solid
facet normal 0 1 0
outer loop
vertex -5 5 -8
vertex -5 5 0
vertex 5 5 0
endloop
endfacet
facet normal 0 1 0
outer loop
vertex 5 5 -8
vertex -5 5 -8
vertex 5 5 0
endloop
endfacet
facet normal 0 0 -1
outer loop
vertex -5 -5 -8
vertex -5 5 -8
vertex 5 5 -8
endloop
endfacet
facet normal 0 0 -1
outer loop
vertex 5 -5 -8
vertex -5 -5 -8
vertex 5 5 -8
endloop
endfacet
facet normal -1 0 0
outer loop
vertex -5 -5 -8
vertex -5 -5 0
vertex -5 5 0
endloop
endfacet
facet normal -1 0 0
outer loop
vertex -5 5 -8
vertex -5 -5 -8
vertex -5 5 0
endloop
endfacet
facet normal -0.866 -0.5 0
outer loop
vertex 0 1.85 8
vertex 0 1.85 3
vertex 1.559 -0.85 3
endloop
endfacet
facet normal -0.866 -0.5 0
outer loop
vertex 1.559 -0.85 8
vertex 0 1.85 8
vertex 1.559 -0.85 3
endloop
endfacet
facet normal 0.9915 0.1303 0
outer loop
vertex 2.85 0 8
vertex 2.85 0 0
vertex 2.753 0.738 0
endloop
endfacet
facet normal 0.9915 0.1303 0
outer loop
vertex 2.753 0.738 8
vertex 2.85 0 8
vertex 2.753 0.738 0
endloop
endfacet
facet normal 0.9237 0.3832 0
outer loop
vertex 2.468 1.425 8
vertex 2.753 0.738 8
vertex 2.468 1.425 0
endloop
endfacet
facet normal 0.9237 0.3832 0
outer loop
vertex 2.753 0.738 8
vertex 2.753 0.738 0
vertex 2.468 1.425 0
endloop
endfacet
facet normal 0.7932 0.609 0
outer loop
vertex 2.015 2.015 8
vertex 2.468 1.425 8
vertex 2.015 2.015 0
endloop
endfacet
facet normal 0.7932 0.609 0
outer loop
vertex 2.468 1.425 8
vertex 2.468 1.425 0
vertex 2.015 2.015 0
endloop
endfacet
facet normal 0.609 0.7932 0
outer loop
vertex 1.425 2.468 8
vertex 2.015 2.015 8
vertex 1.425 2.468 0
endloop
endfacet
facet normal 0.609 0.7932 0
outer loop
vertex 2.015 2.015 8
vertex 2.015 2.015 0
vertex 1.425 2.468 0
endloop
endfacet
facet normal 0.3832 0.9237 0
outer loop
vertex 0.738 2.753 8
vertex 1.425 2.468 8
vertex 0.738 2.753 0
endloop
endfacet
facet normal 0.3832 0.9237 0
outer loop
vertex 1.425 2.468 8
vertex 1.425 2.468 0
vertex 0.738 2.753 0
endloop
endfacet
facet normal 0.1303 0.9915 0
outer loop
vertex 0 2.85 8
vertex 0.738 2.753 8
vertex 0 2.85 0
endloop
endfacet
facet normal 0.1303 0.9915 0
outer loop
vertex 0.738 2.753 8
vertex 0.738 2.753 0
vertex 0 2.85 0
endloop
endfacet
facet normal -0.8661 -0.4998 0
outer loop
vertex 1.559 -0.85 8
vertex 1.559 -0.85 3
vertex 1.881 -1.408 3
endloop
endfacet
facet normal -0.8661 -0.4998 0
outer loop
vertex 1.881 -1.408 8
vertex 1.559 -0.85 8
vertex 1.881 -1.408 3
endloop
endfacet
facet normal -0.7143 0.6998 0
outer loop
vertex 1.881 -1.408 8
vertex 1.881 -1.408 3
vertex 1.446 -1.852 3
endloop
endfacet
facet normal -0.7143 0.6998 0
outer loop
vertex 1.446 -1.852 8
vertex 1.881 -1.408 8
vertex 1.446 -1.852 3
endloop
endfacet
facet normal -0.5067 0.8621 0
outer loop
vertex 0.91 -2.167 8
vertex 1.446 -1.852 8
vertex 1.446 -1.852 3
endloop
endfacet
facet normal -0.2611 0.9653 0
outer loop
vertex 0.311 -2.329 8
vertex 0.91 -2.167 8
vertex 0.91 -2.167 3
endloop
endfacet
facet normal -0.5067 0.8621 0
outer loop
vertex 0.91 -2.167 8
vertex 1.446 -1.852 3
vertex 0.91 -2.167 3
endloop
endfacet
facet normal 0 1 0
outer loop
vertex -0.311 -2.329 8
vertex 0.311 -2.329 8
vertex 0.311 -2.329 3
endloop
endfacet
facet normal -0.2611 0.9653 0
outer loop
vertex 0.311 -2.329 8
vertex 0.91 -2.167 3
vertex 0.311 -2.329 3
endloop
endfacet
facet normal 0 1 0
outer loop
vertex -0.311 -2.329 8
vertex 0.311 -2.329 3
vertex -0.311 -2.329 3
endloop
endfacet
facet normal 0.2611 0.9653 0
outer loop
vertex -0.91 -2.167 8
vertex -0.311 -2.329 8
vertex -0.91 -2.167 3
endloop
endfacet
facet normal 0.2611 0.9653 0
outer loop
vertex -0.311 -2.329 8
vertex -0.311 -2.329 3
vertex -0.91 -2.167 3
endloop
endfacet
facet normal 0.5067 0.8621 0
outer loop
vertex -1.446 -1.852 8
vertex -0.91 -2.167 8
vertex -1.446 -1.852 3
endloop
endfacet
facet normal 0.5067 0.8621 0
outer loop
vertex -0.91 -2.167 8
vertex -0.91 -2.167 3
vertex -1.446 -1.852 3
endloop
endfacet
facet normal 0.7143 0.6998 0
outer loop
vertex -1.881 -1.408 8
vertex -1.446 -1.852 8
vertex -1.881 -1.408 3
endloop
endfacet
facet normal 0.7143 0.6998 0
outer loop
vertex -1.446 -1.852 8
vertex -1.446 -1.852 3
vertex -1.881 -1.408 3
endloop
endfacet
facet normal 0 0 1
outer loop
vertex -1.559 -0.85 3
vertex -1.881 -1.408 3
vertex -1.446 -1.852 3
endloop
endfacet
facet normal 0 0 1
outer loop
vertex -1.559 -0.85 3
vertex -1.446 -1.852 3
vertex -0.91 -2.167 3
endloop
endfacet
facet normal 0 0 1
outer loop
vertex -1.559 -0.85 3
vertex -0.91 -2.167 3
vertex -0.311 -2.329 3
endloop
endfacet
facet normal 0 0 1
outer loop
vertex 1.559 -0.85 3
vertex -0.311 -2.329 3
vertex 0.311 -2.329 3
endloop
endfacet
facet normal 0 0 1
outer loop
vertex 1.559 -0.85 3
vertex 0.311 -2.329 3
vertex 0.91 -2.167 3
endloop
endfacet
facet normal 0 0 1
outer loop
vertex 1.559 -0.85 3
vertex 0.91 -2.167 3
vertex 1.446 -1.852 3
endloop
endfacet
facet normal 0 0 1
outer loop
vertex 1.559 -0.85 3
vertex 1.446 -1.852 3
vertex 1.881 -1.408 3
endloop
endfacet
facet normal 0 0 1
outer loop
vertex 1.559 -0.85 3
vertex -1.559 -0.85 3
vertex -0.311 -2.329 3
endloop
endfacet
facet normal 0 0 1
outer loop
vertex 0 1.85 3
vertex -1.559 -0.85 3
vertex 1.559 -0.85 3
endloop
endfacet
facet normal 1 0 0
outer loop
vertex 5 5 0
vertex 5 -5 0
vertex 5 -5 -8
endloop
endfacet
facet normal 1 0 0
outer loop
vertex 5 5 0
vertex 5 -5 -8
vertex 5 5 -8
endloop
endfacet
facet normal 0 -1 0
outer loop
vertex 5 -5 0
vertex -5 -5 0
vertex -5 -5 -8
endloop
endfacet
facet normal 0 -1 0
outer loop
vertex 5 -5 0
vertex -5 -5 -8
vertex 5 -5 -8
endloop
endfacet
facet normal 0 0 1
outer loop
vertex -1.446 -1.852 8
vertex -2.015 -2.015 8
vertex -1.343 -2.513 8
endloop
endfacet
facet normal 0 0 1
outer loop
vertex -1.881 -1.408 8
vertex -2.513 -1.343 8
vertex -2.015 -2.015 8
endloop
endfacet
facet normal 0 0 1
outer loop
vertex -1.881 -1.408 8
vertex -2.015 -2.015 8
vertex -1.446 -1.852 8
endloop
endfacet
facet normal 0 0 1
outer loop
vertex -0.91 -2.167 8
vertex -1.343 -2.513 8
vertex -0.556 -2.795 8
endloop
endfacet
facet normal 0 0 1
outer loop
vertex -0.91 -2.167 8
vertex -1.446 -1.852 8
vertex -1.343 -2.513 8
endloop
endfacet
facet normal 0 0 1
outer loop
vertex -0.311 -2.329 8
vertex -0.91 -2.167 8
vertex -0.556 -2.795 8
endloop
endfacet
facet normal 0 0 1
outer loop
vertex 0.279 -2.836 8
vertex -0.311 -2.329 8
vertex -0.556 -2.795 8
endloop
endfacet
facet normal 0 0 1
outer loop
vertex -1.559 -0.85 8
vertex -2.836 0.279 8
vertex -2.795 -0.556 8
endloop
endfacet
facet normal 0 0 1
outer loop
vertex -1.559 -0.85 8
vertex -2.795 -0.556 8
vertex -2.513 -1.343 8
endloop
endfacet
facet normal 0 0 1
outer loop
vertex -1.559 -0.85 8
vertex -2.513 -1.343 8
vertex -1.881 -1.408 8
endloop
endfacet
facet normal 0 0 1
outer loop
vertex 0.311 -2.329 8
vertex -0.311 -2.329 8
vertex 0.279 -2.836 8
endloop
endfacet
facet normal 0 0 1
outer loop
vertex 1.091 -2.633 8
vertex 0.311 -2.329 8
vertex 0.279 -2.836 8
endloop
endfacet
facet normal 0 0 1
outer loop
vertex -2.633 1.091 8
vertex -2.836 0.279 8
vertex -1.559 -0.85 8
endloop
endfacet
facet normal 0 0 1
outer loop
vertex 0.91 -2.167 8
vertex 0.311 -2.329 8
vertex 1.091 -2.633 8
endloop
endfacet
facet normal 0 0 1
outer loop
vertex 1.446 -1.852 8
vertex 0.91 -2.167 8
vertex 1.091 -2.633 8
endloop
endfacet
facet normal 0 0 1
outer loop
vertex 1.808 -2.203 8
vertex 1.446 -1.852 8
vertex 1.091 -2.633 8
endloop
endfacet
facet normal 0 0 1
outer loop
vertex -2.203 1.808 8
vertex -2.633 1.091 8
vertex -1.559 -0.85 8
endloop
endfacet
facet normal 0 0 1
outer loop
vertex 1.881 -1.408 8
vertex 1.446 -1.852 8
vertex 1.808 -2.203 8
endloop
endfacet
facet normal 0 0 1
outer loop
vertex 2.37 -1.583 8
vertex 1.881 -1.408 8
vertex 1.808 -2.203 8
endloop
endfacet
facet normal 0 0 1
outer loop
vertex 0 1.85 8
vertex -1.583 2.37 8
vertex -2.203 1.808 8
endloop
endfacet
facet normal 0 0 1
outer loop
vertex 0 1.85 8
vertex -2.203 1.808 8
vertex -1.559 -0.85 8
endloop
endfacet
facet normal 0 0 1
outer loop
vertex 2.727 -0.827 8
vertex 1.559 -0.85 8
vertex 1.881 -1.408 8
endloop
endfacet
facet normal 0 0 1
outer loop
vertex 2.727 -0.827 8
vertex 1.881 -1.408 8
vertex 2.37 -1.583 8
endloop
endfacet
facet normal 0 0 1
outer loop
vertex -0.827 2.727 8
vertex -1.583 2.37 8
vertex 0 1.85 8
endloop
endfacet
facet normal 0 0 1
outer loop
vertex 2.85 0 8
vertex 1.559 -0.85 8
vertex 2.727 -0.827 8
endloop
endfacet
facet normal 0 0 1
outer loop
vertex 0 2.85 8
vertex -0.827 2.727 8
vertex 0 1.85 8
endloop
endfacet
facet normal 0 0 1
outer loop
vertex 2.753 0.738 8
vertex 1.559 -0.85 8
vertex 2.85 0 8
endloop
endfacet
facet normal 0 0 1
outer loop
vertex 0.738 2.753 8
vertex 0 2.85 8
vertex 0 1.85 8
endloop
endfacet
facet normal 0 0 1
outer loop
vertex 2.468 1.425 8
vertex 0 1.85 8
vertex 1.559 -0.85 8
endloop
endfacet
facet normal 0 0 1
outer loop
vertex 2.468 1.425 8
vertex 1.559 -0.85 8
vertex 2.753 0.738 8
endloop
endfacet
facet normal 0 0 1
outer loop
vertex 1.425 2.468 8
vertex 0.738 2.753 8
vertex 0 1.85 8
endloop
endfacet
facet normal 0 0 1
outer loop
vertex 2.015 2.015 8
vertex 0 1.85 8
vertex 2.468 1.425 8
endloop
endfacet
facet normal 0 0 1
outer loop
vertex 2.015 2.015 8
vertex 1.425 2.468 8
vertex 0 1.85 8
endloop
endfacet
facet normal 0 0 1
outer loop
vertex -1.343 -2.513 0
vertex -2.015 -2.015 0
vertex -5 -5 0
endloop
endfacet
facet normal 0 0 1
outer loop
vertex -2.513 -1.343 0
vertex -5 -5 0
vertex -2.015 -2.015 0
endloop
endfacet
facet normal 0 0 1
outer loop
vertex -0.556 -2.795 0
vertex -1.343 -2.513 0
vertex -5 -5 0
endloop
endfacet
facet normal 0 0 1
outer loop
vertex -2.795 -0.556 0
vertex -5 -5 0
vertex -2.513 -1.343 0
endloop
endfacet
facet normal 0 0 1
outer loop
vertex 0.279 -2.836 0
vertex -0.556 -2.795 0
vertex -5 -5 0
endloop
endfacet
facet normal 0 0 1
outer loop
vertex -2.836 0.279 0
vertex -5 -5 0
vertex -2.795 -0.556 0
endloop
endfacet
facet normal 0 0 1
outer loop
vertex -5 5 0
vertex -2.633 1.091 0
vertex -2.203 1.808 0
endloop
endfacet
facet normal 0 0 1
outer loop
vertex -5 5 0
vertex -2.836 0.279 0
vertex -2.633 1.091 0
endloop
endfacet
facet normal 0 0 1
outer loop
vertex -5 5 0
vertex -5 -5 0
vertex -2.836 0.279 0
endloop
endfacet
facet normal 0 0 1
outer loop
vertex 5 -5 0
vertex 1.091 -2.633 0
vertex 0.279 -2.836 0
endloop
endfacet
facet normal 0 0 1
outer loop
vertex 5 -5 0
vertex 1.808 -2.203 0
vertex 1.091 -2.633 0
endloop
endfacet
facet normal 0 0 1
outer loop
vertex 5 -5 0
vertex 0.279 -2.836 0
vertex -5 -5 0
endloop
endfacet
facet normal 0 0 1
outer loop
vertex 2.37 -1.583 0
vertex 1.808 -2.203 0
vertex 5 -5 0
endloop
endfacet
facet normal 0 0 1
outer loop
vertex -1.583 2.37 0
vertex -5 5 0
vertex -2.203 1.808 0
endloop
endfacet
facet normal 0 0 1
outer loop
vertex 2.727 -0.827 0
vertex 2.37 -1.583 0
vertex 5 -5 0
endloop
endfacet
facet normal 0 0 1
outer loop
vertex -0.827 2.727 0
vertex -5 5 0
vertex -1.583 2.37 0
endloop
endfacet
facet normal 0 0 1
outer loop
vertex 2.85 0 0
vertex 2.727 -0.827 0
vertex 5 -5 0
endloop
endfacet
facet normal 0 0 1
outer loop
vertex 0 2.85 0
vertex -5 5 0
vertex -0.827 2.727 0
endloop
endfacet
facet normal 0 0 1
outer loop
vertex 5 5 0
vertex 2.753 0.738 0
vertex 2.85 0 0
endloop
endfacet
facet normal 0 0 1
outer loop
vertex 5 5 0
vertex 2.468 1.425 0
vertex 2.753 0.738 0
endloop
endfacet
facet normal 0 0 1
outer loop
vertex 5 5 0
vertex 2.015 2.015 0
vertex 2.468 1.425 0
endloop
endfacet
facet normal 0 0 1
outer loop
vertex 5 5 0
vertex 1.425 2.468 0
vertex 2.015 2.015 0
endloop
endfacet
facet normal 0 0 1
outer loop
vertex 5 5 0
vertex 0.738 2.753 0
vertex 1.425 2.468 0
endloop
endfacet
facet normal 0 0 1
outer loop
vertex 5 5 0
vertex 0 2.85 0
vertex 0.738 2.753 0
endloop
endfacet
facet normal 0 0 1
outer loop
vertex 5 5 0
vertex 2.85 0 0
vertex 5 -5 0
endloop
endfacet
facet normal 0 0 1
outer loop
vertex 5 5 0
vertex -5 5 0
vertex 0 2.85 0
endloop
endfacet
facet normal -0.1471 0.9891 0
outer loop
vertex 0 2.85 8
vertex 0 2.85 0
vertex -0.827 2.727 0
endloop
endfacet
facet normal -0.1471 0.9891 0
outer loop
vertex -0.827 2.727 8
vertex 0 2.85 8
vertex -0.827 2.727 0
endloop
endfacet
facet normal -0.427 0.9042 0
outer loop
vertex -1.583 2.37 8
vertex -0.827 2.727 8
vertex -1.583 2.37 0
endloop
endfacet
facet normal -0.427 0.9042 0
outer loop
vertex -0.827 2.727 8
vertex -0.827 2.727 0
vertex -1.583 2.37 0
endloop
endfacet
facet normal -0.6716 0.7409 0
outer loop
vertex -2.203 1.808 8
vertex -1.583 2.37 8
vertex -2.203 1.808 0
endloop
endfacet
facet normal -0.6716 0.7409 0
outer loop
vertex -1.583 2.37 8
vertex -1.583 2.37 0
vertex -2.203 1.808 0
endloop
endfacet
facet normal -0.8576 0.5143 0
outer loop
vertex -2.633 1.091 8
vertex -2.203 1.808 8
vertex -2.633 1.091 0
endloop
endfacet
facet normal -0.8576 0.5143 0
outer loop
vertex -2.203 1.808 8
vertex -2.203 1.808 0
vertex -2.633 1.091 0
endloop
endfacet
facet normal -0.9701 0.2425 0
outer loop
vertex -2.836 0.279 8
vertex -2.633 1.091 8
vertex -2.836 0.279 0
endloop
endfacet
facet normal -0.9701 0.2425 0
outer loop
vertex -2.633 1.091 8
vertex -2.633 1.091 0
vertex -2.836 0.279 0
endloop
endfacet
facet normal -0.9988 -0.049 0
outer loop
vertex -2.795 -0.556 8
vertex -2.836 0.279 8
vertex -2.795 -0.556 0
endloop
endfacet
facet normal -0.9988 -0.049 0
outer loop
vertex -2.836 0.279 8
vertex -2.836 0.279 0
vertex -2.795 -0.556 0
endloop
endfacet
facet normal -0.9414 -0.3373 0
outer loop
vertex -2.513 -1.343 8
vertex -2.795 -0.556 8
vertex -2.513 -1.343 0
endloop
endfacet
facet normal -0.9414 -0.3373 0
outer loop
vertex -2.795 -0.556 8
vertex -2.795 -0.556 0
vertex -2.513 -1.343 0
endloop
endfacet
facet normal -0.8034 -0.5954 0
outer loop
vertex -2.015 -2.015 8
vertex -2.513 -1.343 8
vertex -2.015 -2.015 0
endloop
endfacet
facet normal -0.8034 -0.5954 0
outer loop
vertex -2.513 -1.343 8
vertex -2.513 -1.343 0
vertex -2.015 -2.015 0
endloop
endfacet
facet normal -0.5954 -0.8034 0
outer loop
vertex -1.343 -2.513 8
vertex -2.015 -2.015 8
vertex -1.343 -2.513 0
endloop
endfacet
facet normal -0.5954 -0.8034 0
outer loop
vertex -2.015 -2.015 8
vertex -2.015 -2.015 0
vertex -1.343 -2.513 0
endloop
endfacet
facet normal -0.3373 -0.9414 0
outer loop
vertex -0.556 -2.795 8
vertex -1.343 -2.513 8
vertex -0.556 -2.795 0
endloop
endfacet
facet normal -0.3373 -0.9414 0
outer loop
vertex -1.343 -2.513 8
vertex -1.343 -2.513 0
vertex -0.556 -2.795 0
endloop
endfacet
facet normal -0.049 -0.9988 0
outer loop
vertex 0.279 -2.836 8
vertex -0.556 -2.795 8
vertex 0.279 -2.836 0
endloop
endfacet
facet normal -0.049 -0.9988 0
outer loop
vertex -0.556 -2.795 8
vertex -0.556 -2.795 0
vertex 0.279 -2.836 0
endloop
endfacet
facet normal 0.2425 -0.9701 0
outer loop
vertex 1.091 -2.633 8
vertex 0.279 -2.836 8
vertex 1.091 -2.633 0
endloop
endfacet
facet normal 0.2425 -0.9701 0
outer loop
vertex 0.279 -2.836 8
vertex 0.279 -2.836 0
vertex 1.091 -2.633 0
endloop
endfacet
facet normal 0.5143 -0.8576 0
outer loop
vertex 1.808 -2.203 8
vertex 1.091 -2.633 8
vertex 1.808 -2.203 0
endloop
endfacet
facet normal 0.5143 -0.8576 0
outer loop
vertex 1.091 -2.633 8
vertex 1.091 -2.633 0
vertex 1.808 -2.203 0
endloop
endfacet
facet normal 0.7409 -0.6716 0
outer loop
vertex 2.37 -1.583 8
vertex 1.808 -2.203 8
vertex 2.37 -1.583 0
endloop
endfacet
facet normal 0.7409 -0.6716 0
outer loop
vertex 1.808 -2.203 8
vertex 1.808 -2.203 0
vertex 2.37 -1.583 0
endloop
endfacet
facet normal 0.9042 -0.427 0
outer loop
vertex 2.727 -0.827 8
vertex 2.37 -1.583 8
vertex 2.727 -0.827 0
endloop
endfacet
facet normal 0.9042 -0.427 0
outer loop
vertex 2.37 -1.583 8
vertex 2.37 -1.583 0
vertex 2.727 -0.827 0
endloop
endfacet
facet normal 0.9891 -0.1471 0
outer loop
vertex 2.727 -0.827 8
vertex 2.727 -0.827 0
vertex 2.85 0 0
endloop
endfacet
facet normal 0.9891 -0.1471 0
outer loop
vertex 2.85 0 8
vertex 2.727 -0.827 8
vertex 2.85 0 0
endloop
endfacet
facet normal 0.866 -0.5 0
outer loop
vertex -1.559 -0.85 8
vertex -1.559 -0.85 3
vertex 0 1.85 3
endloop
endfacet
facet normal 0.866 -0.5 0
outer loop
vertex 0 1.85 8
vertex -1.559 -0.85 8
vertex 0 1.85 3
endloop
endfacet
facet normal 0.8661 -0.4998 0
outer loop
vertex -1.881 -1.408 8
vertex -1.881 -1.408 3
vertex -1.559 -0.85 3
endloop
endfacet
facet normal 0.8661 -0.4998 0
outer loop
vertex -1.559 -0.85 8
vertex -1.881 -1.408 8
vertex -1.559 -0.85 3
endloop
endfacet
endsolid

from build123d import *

# Parameters (mm, degrees)
F1_DEPTH = 8
F2_DEPTH = 3
F3_W     = 10
F3_H     = 10
F4_DEPTH = 8


with BuildPart() as f1:
    # F0 (on Top) → F1 (new body)
    with BuildSketch(Plane.XY):
        with BuildLine():
            ThreePointArc((0, 2.85), (-2.0152543264, -2.0152543264), (2.85, 0))
            ThreePointArc((2.85, 0), (2.0152543264, 2.0152543264), (0, 2.85))
        make_face()
        with BuildLine():
            ThreePointArc((-1.8812210579, -1.4083704525), (-2.1014483771, 1.0518624997), (0, 2.35))
            ThreePointArc((0, 2.35), (1.6617009358, 1.6617009358), (2.35, 0))
            ThreePointArc((2.35, 0), (2.2297275042, -0.7421692913), (1.8812210579, -1.4083704525))
            ThreePointArc((1.8812210579, -1.4083704525), (0, -2.35), (-1.8812210579, -1.4083704525))
        make_face(mode=Mode.SUBTRACT)
        with BuildLine():
            ThreePointArc((2.35, 0), (1.6617009358, 1.6617009358), (0, 2.35))
            Line((0, 2.35), (0, 1.85))
            Line((0, 1.85), (1.5588457268, -0.85))
            Line((1.5588457268, -0.85), (1.8812210579, -1.4083704525))
            ThreePointArc((1.8812210579, -1.4083704525), (2.2297275042, -0.7421692913), (2.35, 0))
        make_face()
        with BuildLine():
            Line((0, 1.85), (0, 2.35))
            ThreePointArc((0, 2.35), (-2.1014483771, 1.0518624997), (-1.8812210579, -1.4083704525))
            Line((-1.8812210579, -1.4083704525), (-1.5588457268, -0.85))
            Line((-1.5588457268, -0.85), (0, 1.85))
        make_face()
    extrude(amount=F1_DEPTH)

    # F0 (on Top) → F2 (join)
    with BuildSketch(Plane.XY):
        with BuildLine():
            Line((-1.5588457268, -0.85), (-1.8812210579, -1.4083704525))
            ThreePointArc((-1.8812210579, -1.4083704525), (0, -2.35), (1.8812210579, -1.4083704525))
            Line((1.8812210579, -1.4083704525), (1.5588457268, -0.85))
            Line((1.5588457268, -0.85), (0, 1.85))
            Line((0, 1.85), (-1.5588457268, -0.85))
        make_face()
    extrude(amount=F2_DEPTH)

    # F3 (on Top) → F4 (join)
    with BuildSketch(Plane.XY):
        Rectangle(F3_W, F3_H)
    extrude(amount=-F4_DEPTH)


solid = f1.part
